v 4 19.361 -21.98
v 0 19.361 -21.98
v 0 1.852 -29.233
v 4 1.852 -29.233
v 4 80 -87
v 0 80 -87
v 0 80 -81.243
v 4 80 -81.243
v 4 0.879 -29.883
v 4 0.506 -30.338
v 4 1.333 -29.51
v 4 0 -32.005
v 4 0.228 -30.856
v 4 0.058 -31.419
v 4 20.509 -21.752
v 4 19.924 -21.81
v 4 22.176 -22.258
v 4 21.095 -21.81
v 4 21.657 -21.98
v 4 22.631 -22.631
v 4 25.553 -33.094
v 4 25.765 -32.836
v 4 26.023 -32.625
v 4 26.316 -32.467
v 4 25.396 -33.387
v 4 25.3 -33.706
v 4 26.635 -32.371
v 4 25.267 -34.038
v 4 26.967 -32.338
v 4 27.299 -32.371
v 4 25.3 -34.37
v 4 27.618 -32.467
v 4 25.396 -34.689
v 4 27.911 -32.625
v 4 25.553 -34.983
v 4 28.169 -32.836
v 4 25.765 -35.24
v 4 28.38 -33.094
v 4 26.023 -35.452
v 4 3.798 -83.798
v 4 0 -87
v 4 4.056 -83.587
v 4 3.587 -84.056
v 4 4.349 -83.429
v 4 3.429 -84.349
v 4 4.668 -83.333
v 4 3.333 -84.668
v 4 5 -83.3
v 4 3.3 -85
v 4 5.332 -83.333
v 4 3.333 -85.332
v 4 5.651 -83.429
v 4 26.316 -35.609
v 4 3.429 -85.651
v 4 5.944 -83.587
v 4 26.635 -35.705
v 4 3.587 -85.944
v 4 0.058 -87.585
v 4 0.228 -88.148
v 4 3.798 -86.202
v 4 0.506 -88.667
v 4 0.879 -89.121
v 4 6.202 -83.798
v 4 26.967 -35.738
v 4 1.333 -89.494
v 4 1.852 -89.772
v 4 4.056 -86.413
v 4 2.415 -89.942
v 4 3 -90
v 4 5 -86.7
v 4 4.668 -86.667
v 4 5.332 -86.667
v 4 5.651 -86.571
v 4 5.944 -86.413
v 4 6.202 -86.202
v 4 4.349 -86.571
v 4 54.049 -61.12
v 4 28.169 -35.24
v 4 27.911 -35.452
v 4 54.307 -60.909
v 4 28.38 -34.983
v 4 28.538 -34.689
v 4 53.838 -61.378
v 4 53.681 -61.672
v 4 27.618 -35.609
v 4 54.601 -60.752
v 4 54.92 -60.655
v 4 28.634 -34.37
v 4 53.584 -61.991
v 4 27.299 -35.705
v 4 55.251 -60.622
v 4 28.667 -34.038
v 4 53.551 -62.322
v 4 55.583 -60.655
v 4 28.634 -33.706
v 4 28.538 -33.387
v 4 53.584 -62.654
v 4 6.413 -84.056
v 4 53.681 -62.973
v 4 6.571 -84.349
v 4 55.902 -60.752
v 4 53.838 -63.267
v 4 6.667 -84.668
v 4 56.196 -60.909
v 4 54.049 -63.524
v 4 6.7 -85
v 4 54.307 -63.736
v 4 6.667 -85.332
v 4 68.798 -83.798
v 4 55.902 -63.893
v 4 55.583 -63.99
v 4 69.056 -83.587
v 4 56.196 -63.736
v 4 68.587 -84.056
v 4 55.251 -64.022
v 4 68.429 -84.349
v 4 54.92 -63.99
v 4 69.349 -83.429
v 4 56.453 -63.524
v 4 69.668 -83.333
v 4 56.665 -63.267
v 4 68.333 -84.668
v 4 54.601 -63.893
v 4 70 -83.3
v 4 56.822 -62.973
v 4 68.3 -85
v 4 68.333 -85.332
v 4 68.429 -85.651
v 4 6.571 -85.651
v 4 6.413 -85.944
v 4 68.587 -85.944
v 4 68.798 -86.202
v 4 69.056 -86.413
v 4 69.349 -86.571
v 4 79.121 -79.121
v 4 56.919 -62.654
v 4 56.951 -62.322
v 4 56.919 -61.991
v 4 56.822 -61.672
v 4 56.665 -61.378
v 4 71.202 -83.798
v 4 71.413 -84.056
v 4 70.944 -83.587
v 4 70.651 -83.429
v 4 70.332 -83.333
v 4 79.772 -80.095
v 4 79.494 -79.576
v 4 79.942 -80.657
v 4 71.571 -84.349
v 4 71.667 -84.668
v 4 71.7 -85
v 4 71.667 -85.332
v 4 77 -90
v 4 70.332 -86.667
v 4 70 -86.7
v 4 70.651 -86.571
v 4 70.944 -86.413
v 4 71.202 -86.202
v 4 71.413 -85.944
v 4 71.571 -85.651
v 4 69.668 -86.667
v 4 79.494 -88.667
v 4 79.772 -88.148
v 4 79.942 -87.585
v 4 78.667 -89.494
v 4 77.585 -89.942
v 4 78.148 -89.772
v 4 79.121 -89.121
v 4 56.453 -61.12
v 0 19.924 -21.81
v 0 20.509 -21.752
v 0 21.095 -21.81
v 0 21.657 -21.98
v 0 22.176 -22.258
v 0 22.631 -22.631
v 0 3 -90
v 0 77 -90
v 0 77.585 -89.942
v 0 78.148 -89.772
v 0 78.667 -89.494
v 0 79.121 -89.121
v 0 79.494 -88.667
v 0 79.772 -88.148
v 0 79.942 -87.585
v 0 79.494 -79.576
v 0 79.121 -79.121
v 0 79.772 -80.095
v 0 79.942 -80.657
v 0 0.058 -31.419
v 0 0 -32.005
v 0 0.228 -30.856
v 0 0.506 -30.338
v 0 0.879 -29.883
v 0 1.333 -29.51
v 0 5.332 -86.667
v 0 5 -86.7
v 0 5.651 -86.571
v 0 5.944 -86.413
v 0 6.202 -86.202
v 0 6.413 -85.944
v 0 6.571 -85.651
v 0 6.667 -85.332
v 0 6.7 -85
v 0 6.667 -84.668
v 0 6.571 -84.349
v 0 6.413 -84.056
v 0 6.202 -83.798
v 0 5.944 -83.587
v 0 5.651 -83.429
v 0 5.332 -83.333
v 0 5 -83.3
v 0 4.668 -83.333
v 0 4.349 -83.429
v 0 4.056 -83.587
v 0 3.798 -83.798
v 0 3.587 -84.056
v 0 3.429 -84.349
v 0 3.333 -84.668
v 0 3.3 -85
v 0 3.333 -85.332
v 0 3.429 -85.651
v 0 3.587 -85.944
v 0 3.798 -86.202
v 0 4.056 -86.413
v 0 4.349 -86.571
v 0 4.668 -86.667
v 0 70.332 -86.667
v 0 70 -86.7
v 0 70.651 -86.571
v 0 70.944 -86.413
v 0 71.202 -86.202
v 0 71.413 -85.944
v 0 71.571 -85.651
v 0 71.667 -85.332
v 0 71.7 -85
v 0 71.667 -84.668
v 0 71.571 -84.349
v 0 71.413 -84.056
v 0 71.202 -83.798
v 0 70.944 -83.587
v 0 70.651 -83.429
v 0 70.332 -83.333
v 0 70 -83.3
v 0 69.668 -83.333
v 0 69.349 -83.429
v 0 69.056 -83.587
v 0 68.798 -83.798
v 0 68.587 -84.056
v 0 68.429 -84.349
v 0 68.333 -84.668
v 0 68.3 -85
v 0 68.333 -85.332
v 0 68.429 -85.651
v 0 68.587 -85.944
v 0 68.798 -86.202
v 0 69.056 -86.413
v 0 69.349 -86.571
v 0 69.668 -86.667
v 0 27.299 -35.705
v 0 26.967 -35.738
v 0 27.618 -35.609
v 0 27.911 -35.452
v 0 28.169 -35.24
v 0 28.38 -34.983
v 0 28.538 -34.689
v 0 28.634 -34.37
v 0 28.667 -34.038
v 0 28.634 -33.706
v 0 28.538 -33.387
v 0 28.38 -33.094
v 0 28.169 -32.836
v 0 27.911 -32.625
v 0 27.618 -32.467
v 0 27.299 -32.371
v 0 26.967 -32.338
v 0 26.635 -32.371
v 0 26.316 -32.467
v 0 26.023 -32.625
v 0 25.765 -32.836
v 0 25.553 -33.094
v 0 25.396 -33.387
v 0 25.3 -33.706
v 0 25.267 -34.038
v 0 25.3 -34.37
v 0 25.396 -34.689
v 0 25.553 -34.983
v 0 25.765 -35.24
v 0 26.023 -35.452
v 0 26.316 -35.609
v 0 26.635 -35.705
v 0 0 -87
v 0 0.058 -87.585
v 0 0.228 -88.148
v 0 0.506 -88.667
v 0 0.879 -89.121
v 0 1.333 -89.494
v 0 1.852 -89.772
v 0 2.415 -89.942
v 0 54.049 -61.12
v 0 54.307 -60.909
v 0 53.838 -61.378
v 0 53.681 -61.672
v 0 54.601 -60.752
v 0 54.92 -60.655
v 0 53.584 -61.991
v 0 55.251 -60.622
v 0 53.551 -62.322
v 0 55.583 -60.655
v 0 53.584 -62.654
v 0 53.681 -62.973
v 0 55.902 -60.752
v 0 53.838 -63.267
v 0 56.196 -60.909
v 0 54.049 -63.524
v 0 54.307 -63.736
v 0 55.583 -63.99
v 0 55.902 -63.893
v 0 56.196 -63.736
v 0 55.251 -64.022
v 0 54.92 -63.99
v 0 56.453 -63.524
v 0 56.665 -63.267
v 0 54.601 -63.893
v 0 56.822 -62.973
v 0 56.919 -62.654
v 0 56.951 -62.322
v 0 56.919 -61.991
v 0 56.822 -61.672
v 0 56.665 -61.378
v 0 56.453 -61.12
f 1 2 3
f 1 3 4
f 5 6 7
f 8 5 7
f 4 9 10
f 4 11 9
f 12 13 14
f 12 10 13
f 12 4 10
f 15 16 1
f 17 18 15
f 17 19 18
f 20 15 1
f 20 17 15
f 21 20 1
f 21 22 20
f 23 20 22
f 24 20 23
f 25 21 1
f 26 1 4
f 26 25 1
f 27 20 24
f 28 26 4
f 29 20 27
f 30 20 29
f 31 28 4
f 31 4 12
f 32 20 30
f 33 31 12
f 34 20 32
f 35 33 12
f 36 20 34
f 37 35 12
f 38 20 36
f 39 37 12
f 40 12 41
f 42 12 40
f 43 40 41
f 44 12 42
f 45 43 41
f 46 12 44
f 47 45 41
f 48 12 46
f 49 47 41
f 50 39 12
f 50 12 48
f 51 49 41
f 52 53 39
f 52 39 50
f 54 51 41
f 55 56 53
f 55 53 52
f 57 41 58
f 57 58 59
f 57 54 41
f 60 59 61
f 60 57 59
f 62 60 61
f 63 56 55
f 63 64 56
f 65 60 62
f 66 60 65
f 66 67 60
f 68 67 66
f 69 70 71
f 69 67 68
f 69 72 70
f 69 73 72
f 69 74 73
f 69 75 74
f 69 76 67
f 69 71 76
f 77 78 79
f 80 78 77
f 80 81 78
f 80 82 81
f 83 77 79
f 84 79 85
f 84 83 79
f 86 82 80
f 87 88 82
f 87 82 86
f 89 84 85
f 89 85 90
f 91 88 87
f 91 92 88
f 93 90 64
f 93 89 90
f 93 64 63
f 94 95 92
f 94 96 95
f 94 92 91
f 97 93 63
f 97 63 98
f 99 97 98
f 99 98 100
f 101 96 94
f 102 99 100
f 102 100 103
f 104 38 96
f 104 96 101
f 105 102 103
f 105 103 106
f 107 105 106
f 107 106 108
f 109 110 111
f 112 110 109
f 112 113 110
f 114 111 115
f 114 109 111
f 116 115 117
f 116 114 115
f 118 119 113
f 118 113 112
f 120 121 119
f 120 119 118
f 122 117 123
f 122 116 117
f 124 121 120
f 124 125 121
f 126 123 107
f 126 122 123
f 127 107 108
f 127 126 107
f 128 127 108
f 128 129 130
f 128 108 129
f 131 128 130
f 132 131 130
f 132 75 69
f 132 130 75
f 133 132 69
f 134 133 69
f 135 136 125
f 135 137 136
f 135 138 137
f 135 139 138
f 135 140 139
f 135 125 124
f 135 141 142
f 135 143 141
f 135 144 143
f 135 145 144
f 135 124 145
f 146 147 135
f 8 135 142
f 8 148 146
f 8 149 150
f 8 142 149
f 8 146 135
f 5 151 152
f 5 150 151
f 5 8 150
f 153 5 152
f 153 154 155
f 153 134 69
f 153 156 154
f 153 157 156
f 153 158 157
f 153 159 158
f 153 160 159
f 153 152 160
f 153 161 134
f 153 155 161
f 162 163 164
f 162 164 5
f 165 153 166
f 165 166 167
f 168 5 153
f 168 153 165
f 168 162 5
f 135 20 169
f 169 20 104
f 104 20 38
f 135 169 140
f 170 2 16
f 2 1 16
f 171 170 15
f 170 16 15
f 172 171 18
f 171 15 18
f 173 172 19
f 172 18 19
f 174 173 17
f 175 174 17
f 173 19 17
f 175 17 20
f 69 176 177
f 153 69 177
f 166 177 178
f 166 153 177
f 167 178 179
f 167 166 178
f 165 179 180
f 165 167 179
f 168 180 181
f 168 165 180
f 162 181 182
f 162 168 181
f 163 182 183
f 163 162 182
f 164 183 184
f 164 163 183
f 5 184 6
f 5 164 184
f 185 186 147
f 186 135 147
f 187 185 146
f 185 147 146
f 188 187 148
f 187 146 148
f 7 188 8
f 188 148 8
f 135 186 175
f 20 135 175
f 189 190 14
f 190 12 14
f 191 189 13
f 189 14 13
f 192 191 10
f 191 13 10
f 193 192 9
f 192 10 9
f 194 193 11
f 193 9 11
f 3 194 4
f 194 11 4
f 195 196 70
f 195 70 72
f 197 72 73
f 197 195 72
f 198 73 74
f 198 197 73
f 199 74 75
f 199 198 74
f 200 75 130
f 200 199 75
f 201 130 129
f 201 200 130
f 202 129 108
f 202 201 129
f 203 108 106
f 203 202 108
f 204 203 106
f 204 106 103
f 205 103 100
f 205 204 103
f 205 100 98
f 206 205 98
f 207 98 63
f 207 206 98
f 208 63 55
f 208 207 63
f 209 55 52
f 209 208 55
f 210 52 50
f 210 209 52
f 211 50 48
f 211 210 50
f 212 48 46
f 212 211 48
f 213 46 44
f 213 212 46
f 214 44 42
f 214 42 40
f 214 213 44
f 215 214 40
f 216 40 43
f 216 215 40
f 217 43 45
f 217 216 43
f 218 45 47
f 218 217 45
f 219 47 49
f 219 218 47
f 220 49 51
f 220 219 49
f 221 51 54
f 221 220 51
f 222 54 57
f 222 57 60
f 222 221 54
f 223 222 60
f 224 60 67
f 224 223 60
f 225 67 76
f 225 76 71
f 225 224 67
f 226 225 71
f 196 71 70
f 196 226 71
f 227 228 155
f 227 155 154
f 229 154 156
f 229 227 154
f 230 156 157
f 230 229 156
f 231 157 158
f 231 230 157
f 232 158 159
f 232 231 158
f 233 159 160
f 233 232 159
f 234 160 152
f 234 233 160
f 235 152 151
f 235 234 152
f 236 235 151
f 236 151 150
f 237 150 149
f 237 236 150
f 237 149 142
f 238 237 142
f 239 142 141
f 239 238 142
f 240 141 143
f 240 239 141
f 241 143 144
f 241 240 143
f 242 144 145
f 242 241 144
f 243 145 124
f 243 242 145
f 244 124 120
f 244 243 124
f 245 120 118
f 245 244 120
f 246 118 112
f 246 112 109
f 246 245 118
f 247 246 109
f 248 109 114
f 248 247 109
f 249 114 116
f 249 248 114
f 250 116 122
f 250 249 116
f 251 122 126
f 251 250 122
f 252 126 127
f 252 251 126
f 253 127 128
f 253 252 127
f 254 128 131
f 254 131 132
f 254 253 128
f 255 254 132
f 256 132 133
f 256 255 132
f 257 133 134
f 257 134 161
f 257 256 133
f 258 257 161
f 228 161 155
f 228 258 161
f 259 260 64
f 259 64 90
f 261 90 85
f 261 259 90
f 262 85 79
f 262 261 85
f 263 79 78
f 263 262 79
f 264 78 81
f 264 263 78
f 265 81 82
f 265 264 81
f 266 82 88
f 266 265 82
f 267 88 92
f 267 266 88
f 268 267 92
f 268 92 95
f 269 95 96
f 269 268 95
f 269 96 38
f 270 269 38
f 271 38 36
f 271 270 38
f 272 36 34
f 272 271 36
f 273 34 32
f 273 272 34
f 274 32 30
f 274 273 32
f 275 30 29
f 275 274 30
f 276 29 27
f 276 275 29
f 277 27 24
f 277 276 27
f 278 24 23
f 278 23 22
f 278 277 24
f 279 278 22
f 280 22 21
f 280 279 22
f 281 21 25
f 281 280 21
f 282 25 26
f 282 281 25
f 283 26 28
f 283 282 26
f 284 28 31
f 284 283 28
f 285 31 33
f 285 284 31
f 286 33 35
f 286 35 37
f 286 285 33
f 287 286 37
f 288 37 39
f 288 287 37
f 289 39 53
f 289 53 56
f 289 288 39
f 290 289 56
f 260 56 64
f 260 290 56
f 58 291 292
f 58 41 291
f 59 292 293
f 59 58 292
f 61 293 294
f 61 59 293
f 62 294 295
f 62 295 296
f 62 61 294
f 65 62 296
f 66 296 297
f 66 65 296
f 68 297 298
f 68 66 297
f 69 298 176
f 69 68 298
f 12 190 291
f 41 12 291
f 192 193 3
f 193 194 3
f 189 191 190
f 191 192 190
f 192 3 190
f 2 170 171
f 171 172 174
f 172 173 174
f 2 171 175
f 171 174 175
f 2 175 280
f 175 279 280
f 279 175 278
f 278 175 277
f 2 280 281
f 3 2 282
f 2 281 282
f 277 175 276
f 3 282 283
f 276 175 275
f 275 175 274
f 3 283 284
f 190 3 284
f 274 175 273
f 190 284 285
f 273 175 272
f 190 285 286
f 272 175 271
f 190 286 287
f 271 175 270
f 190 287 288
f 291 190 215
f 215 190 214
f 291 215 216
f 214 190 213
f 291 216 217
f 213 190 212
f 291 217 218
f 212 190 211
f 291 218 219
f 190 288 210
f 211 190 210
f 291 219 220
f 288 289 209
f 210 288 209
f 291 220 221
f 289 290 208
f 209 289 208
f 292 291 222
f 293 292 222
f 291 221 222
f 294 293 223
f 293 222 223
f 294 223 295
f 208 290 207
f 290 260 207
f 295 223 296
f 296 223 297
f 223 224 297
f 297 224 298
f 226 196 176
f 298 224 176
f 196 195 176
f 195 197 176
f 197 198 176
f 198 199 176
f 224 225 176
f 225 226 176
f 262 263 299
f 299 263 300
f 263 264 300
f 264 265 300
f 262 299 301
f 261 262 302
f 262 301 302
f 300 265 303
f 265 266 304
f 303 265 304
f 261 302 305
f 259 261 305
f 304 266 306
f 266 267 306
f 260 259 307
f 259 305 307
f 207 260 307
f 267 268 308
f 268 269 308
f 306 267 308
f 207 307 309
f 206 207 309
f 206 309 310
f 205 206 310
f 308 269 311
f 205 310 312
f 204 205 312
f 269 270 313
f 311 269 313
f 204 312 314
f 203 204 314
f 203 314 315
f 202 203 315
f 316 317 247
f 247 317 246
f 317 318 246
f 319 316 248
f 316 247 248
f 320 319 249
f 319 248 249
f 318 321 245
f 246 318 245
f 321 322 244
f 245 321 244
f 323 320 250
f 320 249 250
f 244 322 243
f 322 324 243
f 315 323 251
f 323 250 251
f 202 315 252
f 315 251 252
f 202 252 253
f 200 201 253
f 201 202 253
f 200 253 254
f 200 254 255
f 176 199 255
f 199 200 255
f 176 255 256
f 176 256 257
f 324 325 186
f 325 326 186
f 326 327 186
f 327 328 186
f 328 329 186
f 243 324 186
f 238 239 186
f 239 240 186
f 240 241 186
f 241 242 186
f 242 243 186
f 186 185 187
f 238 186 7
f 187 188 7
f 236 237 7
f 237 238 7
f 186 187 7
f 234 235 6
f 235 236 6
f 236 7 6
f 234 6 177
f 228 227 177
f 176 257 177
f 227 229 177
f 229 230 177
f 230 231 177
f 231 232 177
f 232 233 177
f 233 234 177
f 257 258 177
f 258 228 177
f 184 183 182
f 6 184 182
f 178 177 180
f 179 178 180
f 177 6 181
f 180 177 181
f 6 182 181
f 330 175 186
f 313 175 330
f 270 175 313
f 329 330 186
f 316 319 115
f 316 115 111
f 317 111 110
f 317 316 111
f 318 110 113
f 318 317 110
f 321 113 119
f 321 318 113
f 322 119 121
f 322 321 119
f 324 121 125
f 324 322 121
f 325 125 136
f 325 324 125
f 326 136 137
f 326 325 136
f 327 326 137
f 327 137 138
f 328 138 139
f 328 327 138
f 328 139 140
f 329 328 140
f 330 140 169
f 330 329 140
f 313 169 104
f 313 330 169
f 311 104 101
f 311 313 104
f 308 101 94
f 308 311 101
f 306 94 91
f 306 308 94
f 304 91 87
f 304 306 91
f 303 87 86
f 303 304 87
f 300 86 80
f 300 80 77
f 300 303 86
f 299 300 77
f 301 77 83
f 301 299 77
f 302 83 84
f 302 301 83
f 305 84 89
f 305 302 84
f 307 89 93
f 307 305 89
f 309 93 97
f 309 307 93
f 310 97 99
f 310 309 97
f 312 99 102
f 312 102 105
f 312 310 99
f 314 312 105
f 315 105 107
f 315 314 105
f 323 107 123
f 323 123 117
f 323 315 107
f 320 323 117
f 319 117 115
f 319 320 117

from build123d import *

# Parameters (mm, degrees)
SKETCH_3_R      = 1.7
EXTRUDE_3_DEPTH = 4
CHAMFER_1_SIZE  = 30
FILLET_1_R      = 3


with BuildPart() as part:
    # 草图3 → 凸台-拉伸3 (new body)
    with BuildSketch(Plane(origin=(0, 0, 0), x_dir=(0, 0, -1), z_dir=(1, 0, 0))):
        Polygon((0, 0), (80, 0), (90, 0), (90, 80), (80, 80), align=None)
        with Locations((85, 5)):
            Circle(SKETCH_3_R, mode=Mode.SUBTRACT)
        with Locations((85, 70)):
            Circle(SKETCH_3_R, mode=Mode.SUBTRACT)
        with Locations((62.32233047, 55.251262658)):
            Circle(SKETCH_3_R, mode=Mode.SUBTRACT)
        with Locations((34.038059223, 26.966991411)):
            Circle(SKETCH_3_R, mode=Mode.SUBTRACT)
    extrude(amount=EXTRUDE_3_DEPTH)

    # 倒角1
    chamfer_1_edges = [part.edges().sort_by_distance(p)[0] for p in [
        (2, 0, 0),
    ]]
    chamfer(chamfer_1_edges, length=CHAMFER_1_SIZE)

    # 圆角1
    fillet_1_edges = [part.edges().sort_by_distance(p)[0] for p in [
        (2, 0, -30),
        (2, 21.213203436, -21.213203436),
        (2, 80, -80),
        (2, 80, -90),
        (2, 0, -90),
    ]]
    fillet(fillet_1_edges, radius=FILLET_1_R)


solid = part.part
